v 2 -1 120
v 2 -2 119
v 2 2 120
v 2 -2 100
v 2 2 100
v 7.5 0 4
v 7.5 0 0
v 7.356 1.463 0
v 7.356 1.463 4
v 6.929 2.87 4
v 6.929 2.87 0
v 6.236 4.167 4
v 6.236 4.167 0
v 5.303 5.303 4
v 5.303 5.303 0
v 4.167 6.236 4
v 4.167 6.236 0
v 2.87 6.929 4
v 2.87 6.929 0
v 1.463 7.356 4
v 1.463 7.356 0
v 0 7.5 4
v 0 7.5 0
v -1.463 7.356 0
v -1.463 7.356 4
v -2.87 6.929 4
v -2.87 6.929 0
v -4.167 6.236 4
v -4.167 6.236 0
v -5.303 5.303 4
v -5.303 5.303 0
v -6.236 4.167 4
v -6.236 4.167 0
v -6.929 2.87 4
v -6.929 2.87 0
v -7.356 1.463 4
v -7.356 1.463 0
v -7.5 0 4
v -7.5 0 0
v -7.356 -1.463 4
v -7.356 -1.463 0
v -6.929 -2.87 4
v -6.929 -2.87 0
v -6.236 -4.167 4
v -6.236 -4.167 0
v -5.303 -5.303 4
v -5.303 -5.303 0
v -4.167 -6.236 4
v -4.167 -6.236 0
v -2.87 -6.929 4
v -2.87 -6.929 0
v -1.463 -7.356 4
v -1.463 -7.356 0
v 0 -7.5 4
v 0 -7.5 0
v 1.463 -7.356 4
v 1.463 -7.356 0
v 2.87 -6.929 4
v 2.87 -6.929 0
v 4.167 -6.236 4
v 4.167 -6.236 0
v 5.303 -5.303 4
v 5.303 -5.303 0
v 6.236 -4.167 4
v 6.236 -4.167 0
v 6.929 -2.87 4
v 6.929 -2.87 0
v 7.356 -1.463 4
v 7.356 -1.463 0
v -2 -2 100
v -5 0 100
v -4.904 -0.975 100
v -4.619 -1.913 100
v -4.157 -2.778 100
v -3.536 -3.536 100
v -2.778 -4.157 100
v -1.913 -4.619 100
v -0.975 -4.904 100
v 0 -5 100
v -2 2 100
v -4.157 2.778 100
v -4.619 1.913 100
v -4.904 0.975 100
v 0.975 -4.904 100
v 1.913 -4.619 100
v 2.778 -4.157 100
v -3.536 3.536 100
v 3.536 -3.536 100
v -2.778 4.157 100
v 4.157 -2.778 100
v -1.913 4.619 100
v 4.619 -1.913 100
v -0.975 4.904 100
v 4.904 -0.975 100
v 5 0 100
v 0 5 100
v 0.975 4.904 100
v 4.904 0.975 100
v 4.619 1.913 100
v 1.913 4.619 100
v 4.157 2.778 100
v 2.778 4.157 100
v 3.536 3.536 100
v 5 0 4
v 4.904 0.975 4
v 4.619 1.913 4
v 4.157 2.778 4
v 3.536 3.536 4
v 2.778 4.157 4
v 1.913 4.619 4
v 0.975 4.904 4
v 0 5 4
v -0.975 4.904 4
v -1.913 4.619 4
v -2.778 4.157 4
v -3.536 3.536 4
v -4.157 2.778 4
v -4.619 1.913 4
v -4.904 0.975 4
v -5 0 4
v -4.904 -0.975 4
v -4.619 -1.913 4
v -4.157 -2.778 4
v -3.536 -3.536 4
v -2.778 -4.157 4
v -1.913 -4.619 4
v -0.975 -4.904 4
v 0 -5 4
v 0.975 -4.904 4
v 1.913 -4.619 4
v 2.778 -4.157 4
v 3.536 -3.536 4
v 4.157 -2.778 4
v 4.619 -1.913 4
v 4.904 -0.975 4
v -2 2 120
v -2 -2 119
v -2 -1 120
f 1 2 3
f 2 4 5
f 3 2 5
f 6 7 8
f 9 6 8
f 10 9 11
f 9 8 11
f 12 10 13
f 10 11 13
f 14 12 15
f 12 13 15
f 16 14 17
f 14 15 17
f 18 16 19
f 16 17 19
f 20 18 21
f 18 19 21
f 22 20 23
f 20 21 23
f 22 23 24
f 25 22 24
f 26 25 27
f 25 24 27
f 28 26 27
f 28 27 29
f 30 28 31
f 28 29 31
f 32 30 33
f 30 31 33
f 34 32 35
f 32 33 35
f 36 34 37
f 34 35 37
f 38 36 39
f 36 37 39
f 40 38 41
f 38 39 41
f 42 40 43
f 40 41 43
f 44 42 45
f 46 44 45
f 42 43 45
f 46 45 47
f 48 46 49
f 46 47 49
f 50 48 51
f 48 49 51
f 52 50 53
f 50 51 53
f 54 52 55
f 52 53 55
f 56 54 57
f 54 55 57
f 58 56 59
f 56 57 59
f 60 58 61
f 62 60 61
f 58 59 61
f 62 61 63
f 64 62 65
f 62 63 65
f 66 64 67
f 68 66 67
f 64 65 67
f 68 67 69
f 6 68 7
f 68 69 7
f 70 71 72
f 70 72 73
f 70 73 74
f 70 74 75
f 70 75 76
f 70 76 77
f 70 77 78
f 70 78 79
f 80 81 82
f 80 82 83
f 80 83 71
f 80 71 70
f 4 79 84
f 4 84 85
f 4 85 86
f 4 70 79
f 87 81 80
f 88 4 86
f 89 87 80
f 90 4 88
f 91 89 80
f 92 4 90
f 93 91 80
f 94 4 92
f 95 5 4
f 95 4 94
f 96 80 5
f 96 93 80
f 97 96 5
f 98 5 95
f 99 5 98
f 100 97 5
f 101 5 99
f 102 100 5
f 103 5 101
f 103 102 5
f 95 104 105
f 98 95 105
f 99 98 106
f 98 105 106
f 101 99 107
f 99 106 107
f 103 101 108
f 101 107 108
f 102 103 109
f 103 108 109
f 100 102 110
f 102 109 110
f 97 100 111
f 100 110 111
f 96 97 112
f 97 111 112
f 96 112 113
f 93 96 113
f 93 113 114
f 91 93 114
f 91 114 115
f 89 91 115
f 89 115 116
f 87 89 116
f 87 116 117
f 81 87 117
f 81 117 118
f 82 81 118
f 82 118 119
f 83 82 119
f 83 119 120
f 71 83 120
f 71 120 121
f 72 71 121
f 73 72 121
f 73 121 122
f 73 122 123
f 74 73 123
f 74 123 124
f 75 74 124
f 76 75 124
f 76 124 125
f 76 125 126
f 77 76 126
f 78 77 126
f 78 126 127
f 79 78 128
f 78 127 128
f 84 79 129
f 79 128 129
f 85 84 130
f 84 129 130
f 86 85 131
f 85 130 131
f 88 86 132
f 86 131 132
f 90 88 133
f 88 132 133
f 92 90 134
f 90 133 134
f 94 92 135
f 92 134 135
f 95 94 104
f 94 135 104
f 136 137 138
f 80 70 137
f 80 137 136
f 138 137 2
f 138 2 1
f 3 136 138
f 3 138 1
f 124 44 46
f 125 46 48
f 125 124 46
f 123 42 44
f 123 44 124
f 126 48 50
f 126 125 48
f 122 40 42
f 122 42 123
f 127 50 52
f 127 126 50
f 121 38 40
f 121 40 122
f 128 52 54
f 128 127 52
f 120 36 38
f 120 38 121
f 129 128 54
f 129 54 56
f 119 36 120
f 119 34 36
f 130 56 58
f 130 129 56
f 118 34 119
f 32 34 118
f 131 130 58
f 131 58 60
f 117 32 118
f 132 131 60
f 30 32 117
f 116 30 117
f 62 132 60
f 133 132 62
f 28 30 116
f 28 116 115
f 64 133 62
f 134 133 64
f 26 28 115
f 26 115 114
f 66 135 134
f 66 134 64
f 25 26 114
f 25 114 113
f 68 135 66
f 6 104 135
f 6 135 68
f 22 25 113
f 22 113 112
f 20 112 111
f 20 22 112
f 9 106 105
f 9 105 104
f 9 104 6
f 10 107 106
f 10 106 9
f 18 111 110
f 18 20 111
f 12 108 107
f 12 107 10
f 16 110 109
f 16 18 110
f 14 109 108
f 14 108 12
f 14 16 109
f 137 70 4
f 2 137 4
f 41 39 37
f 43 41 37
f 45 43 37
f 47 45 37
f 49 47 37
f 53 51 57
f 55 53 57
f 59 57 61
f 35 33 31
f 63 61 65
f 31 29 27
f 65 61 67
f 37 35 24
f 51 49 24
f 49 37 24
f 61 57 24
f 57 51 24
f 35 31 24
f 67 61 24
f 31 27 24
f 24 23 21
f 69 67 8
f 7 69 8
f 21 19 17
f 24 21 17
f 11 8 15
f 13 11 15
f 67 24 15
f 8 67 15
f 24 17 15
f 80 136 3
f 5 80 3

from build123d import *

# Parameters (mm, degrees)
F0_R          = 7.5
F1_DEPTH      = 4
F2_R          = 5
F3_DEPTH      = 100
F4_W          = 4
F4_H          = 4
F5_DEPTH      = 20
F7_DEPTH      = 25
F7_DEPTH_BACK = 25


with BuildPart() as f1:
    # F0 (on Top) → F1 (new body)
    with BuildSketch(Plane.XY):
        Circle(F0_R)
    extrude(amount=F1_DEPTH)

    # F2 (on Top) → F3 (join)
    with BuildSketch(Plane.XY):
        Circle(F2_R)
    extrude(amount=F3_DEPTH)

    # F4 (on face) → F5 (join)
    with BuildSketch(Plane.XY.offset(100)):
        Rectangle(F4_W, F4_H)
    extrude(amount=F5_DEPTH)

    # F6 (on Right) → F7 (cut, two sides)
    with BuildSketch(Plane.YZ) as f7_sk:
        Polygon((0, 121), (-3, 121), (-3, 118), align=None)
    extrude(amount=-F7_DEPTH, mode=Mode.SUBTRACT)
    extrude(f7_sk.sketch, amount=F7_DEPTH_BACK, mode=Mode.SUBTRACT)


solid = f1.part
